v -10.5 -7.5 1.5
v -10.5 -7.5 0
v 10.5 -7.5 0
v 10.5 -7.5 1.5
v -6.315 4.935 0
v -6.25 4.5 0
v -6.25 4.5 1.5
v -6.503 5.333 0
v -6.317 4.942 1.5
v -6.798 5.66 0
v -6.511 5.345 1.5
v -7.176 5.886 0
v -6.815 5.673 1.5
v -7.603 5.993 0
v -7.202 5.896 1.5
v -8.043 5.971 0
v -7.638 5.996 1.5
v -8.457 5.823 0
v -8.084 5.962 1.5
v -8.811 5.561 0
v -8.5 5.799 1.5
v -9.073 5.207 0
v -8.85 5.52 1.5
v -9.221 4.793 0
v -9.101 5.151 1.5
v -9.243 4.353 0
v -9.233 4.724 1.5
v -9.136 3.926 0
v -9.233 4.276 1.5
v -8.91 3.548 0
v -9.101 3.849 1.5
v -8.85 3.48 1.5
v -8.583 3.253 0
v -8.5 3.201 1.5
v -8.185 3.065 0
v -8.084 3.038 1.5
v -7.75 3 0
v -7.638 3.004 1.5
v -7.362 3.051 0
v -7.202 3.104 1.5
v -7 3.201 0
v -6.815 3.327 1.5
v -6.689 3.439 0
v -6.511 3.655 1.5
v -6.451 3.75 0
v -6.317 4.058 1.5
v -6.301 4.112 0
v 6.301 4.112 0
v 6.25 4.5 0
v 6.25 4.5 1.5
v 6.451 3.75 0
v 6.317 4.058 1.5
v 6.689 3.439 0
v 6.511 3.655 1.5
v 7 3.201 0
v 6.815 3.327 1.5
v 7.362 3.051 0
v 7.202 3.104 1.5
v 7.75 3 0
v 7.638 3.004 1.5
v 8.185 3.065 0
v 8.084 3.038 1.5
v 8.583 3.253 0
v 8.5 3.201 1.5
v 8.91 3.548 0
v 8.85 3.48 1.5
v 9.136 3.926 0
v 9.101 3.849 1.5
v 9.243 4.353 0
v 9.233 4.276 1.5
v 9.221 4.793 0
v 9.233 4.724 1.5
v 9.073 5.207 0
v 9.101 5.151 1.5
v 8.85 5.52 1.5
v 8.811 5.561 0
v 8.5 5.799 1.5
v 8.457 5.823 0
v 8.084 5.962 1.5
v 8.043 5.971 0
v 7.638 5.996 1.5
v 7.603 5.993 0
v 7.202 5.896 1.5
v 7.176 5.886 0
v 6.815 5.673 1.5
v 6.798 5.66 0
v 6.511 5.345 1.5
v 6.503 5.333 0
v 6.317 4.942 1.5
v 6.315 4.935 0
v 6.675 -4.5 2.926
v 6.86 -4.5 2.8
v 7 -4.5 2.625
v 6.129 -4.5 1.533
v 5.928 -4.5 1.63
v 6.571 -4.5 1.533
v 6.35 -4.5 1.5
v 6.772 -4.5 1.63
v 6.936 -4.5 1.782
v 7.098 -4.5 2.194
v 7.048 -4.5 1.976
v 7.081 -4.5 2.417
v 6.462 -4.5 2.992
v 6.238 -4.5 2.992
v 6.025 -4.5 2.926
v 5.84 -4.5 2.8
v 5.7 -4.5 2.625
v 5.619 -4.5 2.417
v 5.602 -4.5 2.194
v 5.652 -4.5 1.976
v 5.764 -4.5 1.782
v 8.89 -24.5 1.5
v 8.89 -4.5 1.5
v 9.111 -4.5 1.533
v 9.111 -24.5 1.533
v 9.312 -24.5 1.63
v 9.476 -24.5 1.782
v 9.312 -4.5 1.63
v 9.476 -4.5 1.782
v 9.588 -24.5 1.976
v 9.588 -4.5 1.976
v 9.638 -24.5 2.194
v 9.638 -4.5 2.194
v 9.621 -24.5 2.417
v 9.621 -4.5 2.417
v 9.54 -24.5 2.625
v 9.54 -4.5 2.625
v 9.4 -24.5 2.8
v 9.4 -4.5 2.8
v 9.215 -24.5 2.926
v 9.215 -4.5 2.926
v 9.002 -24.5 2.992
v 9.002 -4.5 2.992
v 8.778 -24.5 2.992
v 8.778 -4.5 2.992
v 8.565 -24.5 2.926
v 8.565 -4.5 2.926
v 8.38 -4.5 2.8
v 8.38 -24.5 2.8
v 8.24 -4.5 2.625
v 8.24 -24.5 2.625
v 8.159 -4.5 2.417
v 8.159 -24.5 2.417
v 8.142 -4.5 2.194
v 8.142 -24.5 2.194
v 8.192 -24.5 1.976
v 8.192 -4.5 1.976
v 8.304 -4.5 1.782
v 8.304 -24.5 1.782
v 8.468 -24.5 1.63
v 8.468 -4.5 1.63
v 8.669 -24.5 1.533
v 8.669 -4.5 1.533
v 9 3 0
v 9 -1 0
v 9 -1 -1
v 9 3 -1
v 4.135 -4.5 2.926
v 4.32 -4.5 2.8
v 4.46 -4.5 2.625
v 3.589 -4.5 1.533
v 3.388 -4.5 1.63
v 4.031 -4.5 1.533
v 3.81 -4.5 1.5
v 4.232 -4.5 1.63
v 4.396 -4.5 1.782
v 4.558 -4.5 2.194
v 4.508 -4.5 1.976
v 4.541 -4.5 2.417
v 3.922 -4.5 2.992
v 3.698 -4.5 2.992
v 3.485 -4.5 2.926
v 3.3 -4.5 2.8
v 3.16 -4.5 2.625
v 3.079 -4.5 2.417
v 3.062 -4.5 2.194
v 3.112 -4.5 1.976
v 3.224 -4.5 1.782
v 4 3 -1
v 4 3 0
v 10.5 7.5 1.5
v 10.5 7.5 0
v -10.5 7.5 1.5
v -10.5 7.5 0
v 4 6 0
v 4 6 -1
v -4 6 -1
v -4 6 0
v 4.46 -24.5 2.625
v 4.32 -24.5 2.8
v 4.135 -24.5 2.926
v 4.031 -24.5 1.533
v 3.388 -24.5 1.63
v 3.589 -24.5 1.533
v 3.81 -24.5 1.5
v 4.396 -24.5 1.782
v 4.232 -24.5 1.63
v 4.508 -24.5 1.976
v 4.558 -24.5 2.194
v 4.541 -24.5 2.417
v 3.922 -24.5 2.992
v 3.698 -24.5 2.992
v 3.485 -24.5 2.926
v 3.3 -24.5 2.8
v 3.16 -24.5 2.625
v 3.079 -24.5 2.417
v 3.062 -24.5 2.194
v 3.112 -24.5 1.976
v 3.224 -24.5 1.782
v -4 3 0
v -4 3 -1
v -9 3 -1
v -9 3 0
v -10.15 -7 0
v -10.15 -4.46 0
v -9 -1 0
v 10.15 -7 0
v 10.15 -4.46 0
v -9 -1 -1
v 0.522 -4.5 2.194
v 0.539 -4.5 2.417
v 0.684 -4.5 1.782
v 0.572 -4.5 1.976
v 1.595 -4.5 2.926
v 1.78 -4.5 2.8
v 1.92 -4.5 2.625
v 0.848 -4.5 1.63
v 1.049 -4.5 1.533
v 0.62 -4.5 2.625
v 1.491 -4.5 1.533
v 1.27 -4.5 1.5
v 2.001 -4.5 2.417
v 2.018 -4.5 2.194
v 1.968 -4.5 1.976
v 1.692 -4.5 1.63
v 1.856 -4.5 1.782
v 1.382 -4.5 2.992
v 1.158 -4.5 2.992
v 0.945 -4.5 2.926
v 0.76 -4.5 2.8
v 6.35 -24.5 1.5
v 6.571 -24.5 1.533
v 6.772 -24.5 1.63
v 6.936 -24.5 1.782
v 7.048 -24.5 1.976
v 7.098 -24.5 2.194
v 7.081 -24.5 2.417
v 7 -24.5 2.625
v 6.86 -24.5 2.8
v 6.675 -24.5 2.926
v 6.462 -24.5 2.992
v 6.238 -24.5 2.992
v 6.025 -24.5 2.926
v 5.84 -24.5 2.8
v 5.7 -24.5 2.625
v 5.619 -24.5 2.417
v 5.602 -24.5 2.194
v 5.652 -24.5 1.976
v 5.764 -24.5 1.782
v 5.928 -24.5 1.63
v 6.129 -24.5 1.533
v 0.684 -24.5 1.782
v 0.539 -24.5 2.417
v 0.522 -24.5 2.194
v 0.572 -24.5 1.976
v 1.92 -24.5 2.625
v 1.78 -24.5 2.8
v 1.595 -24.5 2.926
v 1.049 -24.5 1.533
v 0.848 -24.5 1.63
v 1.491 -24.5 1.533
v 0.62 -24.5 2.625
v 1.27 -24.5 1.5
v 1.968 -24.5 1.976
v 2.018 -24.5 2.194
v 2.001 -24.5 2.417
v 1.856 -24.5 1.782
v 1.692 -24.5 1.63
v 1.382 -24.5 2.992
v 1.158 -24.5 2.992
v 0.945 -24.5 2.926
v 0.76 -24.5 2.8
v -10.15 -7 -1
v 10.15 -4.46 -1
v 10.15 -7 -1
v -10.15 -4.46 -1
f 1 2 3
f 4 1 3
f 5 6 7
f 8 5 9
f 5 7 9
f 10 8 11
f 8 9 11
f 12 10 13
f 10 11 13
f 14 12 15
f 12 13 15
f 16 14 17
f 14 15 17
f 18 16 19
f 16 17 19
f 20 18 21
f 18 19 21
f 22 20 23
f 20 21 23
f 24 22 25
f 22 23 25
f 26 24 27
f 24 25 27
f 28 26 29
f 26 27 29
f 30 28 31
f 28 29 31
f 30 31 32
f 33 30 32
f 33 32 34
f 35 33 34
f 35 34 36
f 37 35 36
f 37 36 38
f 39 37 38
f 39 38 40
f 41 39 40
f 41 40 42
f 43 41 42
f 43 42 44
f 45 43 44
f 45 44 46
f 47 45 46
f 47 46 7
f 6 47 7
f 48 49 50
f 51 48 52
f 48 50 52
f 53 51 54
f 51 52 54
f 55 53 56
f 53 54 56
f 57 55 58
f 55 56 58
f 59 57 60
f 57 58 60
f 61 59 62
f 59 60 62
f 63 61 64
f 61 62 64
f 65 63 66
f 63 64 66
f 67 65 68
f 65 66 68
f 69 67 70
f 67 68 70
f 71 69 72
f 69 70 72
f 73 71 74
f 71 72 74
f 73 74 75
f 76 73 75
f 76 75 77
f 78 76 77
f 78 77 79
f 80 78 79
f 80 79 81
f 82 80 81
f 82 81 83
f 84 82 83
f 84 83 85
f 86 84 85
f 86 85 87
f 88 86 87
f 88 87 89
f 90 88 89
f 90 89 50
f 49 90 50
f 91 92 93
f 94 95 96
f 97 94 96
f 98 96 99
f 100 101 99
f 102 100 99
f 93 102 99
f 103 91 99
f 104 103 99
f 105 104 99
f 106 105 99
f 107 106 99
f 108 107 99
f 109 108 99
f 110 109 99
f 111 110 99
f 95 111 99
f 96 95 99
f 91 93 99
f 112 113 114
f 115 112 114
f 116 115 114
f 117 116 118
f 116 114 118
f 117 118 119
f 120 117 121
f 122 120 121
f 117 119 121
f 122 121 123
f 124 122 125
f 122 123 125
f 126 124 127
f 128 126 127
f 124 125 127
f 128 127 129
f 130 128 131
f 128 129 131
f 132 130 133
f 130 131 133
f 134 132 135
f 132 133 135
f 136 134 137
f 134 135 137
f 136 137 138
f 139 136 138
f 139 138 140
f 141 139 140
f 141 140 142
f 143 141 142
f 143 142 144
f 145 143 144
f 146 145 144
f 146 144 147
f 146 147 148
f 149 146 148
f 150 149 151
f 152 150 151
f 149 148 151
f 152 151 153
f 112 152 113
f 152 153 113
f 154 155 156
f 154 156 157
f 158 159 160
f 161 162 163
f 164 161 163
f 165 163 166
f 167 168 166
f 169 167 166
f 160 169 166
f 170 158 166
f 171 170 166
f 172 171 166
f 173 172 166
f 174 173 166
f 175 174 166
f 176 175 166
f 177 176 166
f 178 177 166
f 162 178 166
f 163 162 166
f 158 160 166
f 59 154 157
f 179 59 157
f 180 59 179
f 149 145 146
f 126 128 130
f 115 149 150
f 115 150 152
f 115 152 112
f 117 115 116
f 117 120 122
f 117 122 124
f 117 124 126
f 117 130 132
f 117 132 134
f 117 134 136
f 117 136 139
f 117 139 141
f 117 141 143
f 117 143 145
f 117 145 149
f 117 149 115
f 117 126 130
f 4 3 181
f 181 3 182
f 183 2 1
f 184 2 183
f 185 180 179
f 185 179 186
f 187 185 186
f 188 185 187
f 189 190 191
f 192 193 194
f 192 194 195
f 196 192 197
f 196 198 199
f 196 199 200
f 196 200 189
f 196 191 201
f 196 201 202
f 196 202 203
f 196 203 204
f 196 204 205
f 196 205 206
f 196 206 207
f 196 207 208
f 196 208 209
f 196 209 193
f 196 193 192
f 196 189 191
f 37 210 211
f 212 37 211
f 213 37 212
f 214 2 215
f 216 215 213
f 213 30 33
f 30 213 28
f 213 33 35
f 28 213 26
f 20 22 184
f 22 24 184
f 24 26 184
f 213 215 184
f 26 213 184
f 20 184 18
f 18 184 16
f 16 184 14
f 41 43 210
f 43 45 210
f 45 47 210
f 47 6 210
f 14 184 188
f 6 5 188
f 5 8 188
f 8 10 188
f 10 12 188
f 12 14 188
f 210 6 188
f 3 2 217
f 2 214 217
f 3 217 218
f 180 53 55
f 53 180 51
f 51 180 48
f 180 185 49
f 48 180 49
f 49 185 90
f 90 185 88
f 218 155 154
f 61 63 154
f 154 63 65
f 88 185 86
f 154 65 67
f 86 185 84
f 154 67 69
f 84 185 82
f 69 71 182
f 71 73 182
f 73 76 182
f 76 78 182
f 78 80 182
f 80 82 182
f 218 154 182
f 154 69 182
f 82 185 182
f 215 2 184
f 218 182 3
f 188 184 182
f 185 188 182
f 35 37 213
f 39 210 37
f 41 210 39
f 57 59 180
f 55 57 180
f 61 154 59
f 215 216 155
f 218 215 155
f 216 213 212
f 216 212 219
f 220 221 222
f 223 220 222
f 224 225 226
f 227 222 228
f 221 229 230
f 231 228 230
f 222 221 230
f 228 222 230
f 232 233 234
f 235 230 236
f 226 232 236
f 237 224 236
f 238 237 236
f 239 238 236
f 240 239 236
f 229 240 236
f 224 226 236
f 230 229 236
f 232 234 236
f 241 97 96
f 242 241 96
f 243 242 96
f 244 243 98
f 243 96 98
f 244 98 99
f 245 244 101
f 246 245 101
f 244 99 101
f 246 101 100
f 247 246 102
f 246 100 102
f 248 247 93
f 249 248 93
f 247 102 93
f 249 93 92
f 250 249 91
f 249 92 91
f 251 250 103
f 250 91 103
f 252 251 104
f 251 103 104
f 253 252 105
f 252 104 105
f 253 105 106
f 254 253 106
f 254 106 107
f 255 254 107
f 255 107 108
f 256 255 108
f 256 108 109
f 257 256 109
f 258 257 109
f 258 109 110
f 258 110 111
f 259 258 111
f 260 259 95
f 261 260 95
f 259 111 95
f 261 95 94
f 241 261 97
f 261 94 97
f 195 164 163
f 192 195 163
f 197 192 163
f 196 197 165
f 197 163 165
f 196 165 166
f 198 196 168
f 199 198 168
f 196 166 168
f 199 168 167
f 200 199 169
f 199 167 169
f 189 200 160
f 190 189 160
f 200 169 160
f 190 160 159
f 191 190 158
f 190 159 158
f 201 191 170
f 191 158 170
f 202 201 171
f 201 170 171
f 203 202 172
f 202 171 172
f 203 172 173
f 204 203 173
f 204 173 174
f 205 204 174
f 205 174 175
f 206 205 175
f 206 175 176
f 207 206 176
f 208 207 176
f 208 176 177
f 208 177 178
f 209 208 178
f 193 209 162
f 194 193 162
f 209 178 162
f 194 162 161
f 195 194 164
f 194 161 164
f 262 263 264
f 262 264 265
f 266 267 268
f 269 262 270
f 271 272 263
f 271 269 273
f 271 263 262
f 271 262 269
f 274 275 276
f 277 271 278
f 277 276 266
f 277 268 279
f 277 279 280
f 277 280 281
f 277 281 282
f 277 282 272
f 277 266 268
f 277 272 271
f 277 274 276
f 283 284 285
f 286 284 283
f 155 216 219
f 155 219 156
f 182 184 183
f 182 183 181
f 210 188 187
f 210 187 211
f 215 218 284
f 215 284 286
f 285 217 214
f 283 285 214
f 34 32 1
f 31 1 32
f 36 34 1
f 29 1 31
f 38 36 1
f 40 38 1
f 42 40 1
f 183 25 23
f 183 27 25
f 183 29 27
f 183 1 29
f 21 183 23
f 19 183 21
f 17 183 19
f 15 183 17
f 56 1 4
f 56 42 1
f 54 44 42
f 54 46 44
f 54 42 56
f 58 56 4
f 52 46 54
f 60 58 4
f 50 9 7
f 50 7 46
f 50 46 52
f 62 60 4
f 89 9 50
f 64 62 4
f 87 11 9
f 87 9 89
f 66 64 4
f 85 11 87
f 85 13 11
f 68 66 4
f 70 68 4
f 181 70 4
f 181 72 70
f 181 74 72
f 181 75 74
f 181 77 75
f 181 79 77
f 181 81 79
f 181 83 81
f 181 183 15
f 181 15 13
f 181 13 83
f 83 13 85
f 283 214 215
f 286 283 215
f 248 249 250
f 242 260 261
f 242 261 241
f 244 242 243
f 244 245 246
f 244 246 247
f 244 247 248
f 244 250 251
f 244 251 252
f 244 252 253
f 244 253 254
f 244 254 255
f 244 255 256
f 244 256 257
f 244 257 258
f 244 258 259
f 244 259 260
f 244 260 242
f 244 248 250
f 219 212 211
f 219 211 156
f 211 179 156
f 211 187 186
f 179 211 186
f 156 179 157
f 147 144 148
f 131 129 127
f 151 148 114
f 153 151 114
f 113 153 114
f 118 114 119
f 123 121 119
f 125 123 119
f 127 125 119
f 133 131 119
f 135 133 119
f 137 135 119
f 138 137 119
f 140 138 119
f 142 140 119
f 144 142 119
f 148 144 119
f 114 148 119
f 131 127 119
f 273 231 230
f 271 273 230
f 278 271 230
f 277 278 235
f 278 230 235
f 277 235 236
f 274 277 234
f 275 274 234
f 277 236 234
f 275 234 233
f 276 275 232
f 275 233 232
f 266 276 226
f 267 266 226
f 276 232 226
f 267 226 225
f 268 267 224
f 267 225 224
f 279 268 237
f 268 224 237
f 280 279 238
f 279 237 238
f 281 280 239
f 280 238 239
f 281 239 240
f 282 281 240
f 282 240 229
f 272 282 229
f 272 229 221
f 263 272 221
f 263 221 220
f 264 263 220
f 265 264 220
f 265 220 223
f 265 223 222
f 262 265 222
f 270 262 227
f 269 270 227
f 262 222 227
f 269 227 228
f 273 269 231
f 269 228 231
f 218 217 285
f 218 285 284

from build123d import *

# Parameters (mm, degrees)
SKETCH2_W                     = 21
SKETCH2_H                     = 15
BOSS_EXTRUDE1_DEPTH           = 1.5
SKETCH3_R                     = 1.5
CUT_EXTRUDE1_DEPTH            = 13.990381057
BOSS_EXTRUDE4_START           = -3
SKETCH7_R                     = 0.75
BOSS_EXTRUDE4_DEPTH           = 20
BOSS_EXTRUDE4_2_DEPTH         = 20
BOSS_EXTRUDE4_3_DEPTH         = 20
BOSS_EXTRUDE4_4_DEPTH         = 20
SKETCH6_W                     = 20.3
SKETCH6_H                     = 2.54
KOPONENTTIEN_TILAVARAUS_DEPTH = 1


with BuildPart() as part:
    # Sketch2 → Boss-Extrude1 (new body)
    with BuildSketch(Plane.XY):
        Rectangle(SKETCH2_W, SKETCH2_H)
    extrude(amount=BOSS_EXTRUDE1_DEPTH)

    # Sketch3 → Cut-Extrude1 (cut, through all)
    with BuildSketch(Plane.XY.offset(1.5)):
        with Locations((-7.75, 4.5)):
            Circle(SKETCH3_R)
        with Locations(Location((7.75, 4.5, 0), (0, 0, 180))):
            Circle(SKETCH3_R)
    extrude(amount=-CUT_EXTRUDE1_DEPTH, mode=Mode.SUBTRACT)

    # Sketch6 → Koponenttien tilavaraus (add)
    with BuildSketch(Plane(origin=(0, 0, 0), x_dir=(-1, 0, 0), z_dir=(0, 0, -1))):
        with Locations((0, -5.73)):
            Rectangle(SKETCH6_W, SKETCH6_H)
        Polygon((-9, 3), (-4, 3), (-4, 6), (4, 6), (4, 3), (9, 3), (9, -1), (-9, -1), align=None)
    extrude(amount=KOPONENTTIEN_TILAVARAUS_DEPTH)


with BuildPart() as body_2:
    # Sketch7 → Boss-Extrude4 (new body)
    with BuildSketch(Plane.XZ.offset(7.5).offset(BOSS_EXTRUDE4_START)):
        with Locations(Location((8.89, 2.25, 0), (0, 0, 270))):
            Circle(SKETCH7_R)
    extrude(amount=BOSS_EXTRUDE4_DEPTH)


with BuildPart() as body_3:
    # Sketch7 → Boss-Extrude4 2 (new body)
    with BuildSketch(Plane.XZ.offset(7.5).offset(BOSS_EXTRUDE4_START)):
        with Locations(Location((6.35, 2.25, 0), (0, 0, 270))):
            Circle(SKETCH7_R)
    extrude(amount=BOSS_EXTRUDE4_2_DEPTH)


with BuildPart() as body_4:
    # Sketch7 → Boss-Extrude4 3 (new body)
    with BuildSketch(Plane.XZ.offset(7.5).offset(BOSS_EXTRUDE4_START)):
        with Locations(Location((3.81, 2.25, 0), (0, 0, 270))):
            Circle(SKETCH7_R)
    extrude(amount=BOSS_EXTRUDE4_3_DEPTH)


with BuildPart() as body_5:
    # Sketch7 → Boss-Extrude4 4 (new body)
    with BuildSketch(Plane.XZ.offset(7.5).offset(BOSS_EXTRUDE4_START)):
        with Locations(Location((1.27, 2.25, 0), (0, 0, 270))):
            Circle(SKETCH7_R)
    extrude(amount=BOSS_EXTRUDE4_4_DEPTH)


solid = Compound([part.part, body_2.part, body_3.part, body_4.part, body_5.part])
